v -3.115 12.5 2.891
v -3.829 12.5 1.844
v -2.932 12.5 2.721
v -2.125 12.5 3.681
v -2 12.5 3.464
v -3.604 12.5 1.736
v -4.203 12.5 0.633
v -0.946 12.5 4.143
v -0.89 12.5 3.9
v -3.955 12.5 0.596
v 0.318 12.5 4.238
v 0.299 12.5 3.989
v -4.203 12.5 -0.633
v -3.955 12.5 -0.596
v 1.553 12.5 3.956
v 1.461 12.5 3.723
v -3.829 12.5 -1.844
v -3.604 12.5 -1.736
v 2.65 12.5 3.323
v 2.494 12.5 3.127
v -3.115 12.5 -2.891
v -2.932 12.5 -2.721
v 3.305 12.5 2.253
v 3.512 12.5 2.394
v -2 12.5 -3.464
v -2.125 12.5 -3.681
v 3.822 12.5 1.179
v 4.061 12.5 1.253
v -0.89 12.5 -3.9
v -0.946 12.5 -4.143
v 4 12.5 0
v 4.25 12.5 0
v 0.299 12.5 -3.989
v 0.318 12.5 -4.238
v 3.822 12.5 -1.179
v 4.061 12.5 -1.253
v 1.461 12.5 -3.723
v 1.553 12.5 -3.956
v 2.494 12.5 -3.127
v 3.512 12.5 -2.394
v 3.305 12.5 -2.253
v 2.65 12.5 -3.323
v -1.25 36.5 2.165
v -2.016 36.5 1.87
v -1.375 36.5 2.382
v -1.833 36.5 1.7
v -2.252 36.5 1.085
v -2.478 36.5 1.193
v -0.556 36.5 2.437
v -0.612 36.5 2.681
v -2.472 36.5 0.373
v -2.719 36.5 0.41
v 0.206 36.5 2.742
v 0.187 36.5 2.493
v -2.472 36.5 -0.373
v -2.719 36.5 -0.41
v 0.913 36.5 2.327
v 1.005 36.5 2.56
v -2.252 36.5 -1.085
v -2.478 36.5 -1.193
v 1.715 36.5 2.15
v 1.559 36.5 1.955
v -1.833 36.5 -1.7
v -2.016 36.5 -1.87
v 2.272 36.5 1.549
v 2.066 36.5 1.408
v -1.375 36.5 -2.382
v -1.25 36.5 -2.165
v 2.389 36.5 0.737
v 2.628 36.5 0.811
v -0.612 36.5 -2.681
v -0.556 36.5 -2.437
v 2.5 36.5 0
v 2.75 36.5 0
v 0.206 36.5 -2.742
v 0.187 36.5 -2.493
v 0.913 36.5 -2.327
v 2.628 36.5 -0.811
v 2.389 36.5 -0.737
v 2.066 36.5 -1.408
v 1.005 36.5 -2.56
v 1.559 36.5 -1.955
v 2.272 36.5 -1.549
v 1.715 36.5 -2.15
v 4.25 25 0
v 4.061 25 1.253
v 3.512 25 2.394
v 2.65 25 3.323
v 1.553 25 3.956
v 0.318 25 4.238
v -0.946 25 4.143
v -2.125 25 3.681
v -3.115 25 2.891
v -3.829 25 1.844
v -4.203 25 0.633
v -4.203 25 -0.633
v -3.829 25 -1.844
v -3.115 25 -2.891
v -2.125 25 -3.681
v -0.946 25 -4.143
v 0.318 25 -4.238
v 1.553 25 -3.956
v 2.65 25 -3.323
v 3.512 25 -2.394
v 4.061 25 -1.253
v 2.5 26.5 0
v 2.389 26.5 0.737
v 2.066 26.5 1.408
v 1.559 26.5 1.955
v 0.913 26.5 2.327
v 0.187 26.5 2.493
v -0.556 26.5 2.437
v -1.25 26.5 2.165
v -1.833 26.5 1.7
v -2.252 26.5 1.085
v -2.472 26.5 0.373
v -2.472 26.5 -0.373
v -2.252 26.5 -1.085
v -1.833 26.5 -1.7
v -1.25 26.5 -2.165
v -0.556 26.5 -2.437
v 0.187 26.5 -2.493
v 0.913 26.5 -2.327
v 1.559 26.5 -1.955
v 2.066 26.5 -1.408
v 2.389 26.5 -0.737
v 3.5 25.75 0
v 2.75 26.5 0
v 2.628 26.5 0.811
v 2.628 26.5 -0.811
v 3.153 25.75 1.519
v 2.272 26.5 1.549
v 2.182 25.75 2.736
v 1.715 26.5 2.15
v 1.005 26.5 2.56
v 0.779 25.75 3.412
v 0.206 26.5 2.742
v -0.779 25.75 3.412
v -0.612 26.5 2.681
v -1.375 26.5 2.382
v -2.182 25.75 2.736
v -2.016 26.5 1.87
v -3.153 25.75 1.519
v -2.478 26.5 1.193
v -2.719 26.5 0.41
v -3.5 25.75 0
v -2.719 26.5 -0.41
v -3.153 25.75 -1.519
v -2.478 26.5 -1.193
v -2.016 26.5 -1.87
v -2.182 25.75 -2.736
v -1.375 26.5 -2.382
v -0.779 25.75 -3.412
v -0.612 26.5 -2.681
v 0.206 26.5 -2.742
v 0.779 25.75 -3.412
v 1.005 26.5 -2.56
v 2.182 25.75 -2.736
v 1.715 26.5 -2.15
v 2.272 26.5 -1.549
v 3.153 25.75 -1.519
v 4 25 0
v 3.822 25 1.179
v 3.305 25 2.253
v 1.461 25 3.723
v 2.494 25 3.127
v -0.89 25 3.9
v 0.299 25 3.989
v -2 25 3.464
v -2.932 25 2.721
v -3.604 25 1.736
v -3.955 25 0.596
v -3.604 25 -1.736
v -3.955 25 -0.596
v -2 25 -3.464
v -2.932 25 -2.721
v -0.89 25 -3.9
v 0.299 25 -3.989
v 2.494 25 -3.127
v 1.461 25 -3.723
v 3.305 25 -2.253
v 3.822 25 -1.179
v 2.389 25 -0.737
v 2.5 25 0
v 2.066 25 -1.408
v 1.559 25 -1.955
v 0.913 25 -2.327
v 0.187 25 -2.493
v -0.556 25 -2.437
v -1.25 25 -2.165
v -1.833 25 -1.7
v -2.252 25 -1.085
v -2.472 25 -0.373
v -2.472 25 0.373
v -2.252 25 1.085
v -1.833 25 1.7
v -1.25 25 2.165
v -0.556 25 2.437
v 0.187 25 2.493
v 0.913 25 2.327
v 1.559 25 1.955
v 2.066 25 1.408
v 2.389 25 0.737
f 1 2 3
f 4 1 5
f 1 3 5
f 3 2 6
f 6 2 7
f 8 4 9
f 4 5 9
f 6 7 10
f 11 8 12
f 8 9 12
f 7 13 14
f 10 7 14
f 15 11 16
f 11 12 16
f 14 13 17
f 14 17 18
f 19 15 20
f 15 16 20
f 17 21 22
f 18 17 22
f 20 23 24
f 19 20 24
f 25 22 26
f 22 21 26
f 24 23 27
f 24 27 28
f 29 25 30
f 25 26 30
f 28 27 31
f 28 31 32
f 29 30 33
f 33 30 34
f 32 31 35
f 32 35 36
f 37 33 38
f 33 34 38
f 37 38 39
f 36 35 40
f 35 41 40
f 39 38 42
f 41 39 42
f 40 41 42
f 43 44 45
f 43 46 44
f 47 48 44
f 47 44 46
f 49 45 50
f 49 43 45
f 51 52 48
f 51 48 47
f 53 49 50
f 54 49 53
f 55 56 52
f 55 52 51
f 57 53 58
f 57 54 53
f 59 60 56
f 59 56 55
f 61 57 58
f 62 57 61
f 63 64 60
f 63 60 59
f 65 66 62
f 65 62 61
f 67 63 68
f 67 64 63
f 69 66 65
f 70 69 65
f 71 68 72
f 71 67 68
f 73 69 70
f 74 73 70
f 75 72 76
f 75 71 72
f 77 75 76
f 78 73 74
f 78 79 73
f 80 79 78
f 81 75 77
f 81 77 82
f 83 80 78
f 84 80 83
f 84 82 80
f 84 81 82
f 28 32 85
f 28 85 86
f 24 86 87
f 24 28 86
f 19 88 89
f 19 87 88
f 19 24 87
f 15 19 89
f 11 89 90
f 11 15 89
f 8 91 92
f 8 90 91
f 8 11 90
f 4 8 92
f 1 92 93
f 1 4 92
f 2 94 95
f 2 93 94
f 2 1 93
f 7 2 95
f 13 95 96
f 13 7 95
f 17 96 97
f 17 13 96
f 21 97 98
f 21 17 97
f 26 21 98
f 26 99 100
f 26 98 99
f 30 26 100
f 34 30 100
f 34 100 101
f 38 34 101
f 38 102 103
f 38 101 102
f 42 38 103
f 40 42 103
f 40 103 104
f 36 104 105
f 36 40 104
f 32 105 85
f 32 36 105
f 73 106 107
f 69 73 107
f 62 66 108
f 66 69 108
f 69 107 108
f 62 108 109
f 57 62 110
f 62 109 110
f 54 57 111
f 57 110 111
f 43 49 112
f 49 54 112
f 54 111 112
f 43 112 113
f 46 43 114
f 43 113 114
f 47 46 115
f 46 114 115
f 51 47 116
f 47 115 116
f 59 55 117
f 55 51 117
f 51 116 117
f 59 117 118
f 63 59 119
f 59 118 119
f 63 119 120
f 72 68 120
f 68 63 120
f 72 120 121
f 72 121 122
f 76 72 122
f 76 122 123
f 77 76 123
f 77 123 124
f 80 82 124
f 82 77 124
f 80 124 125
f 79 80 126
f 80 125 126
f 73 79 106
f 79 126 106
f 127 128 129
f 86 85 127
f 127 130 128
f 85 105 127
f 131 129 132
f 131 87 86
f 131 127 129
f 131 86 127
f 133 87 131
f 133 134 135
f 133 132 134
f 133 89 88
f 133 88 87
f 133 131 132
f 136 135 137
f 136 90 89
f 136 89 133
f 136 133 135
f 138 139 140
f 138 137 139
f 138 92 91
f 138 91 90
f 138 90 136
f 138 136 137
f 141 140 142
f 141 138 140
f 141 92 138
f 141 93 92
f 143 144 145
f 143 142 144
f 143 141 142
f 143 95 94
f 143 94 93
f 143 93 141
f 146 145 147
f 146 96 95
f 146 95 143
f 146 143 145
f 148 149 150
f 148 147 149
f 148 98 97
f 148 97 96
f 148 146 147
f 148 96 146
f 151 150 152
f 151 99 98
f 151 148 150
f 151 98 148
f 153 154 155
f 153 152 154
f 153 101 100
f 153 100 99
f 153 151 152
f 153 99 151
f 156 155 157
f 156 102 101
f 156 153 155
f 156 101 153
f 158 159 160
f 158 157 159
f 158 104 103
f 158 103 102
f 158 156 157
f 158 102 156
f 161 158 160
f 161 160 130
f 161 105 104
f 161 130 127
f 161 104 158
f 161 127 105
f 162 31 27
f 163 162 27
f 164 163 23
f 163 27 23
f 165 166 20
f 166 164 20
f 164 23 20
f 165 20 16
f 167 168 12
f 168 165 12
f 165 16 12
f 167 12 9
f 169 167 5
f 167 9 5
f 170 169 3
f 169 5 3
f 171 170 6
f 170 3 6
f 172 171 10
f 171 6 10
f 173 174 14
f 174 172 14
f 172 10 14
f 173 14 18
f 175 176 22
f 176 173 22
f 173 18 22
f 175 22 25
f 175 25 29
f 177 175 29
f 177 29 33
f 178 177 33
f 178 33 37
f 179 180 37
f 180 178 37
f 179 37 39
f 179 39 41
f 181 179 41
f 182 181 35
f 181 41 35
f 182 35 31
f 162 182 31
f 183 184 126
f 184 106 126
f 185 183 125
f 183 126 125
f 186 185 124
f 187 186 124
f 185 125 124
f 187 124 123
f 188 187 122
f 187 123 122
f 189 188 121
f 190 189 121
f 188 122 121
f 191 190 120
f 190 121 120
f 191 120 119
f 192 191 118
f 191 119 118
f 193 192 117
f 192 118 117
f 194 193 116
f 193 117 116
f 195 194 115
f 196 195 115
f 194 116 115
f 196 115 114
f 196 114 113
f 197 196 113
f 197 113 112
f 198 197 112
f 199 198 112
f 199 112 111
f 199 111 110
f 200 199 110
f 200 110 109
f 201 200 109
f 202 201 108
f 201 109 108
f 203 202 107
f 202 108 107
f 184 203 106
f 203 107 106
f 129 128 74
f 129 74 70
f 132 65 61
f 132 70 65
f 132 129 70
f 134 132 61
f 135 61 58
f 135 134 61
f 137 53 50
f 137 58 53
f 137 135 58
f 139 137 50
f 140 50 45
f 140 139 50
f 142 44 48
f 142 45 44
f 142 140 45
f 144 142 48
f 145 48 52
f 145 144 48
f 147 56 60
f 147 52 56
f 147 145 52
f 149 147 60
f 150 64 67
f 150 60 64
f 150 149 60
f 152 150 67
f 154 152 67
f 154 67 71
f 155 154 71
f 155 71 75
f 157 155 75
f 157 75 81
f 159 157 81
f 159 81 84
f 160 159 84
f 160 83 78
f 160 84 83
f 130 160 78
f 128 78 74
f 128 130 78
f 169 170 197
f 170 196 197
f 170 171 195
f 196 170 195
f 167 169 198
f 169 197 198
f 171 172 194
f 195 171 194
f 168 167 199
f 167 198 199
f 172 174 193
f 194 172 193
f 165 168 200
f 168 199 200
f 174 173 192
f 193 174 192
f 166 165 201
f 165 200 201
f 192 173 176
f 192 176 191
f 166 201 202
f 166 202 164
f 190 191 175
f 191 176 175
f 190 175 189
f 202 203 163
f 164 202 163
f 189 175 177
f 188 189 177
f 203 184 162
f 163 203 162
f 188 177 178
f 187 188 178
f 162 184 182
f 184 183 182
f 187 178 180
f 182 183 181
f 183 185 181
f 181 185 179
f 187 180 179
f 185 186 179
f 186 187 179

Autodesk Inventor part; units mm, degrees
ref_plane "Work Plane3" through (0, 10, 0) normal (0, 1, 0) x (1, 0, 0)
sketch "Sketch2" plane through (0, 10, 0) normal (0, 1, 0) x (1, 0, 0)
  circle A0 centre (0, 0) radius 4
  circle A1 centre (0, 0) radius 4.25
  dimension "d4" = 8
  dimension "d5" = 0.25
extrude "Extrusion2" add sketch "Sketch2" along normal blind 15
extrude "Extrusion3" cut sketch "Sketch2" along normal blind 2.5
ref_plane "Work Plane1" through (0, 11.25, 0) normal (0, 1, 0) x (1, 0, 0)
ref_plane "Work Plane2" through (0, 26.5, 0) normal (0, 1, 0) x (1, 0, 0)
sketch "Sketch6" plane through (0, 26.5, 0) normal (0, 1, 0) x (1, 0, 0)
  circle A0 centre (0, 0) radius 2.75
  dimension "d17" = 5.5
loft "Loft1" add profiles "Sketch6" section 1 edges at (-4.25, 25, 0)
sketch "Sketch7" plane through (0, 26.5, 0) normal (0, 1, 0) x (1, 0, 0)
  circle A0 centre (0, 0) radius 2.5
  dimension "d22" = 5
extrude "Extrusion4" cut sketch "Sketch7" against normal blind 2.5
sketch "Sketch8" plane through (0, 26.5, 0) normal (0, 1, 0) x (1, 0, 0)
  circle A0 centre (0, 0) radius 2.75
  circle A1 centre (0, 0) radius 2.5
  dimension "d25" = 5.5
  dimension "d26" = 0.25
extrude "Extrusion5" add sketch "Sketch8" along normal blind 10
properties part number "5mm to 8mm holder" material "PET Plastic"
